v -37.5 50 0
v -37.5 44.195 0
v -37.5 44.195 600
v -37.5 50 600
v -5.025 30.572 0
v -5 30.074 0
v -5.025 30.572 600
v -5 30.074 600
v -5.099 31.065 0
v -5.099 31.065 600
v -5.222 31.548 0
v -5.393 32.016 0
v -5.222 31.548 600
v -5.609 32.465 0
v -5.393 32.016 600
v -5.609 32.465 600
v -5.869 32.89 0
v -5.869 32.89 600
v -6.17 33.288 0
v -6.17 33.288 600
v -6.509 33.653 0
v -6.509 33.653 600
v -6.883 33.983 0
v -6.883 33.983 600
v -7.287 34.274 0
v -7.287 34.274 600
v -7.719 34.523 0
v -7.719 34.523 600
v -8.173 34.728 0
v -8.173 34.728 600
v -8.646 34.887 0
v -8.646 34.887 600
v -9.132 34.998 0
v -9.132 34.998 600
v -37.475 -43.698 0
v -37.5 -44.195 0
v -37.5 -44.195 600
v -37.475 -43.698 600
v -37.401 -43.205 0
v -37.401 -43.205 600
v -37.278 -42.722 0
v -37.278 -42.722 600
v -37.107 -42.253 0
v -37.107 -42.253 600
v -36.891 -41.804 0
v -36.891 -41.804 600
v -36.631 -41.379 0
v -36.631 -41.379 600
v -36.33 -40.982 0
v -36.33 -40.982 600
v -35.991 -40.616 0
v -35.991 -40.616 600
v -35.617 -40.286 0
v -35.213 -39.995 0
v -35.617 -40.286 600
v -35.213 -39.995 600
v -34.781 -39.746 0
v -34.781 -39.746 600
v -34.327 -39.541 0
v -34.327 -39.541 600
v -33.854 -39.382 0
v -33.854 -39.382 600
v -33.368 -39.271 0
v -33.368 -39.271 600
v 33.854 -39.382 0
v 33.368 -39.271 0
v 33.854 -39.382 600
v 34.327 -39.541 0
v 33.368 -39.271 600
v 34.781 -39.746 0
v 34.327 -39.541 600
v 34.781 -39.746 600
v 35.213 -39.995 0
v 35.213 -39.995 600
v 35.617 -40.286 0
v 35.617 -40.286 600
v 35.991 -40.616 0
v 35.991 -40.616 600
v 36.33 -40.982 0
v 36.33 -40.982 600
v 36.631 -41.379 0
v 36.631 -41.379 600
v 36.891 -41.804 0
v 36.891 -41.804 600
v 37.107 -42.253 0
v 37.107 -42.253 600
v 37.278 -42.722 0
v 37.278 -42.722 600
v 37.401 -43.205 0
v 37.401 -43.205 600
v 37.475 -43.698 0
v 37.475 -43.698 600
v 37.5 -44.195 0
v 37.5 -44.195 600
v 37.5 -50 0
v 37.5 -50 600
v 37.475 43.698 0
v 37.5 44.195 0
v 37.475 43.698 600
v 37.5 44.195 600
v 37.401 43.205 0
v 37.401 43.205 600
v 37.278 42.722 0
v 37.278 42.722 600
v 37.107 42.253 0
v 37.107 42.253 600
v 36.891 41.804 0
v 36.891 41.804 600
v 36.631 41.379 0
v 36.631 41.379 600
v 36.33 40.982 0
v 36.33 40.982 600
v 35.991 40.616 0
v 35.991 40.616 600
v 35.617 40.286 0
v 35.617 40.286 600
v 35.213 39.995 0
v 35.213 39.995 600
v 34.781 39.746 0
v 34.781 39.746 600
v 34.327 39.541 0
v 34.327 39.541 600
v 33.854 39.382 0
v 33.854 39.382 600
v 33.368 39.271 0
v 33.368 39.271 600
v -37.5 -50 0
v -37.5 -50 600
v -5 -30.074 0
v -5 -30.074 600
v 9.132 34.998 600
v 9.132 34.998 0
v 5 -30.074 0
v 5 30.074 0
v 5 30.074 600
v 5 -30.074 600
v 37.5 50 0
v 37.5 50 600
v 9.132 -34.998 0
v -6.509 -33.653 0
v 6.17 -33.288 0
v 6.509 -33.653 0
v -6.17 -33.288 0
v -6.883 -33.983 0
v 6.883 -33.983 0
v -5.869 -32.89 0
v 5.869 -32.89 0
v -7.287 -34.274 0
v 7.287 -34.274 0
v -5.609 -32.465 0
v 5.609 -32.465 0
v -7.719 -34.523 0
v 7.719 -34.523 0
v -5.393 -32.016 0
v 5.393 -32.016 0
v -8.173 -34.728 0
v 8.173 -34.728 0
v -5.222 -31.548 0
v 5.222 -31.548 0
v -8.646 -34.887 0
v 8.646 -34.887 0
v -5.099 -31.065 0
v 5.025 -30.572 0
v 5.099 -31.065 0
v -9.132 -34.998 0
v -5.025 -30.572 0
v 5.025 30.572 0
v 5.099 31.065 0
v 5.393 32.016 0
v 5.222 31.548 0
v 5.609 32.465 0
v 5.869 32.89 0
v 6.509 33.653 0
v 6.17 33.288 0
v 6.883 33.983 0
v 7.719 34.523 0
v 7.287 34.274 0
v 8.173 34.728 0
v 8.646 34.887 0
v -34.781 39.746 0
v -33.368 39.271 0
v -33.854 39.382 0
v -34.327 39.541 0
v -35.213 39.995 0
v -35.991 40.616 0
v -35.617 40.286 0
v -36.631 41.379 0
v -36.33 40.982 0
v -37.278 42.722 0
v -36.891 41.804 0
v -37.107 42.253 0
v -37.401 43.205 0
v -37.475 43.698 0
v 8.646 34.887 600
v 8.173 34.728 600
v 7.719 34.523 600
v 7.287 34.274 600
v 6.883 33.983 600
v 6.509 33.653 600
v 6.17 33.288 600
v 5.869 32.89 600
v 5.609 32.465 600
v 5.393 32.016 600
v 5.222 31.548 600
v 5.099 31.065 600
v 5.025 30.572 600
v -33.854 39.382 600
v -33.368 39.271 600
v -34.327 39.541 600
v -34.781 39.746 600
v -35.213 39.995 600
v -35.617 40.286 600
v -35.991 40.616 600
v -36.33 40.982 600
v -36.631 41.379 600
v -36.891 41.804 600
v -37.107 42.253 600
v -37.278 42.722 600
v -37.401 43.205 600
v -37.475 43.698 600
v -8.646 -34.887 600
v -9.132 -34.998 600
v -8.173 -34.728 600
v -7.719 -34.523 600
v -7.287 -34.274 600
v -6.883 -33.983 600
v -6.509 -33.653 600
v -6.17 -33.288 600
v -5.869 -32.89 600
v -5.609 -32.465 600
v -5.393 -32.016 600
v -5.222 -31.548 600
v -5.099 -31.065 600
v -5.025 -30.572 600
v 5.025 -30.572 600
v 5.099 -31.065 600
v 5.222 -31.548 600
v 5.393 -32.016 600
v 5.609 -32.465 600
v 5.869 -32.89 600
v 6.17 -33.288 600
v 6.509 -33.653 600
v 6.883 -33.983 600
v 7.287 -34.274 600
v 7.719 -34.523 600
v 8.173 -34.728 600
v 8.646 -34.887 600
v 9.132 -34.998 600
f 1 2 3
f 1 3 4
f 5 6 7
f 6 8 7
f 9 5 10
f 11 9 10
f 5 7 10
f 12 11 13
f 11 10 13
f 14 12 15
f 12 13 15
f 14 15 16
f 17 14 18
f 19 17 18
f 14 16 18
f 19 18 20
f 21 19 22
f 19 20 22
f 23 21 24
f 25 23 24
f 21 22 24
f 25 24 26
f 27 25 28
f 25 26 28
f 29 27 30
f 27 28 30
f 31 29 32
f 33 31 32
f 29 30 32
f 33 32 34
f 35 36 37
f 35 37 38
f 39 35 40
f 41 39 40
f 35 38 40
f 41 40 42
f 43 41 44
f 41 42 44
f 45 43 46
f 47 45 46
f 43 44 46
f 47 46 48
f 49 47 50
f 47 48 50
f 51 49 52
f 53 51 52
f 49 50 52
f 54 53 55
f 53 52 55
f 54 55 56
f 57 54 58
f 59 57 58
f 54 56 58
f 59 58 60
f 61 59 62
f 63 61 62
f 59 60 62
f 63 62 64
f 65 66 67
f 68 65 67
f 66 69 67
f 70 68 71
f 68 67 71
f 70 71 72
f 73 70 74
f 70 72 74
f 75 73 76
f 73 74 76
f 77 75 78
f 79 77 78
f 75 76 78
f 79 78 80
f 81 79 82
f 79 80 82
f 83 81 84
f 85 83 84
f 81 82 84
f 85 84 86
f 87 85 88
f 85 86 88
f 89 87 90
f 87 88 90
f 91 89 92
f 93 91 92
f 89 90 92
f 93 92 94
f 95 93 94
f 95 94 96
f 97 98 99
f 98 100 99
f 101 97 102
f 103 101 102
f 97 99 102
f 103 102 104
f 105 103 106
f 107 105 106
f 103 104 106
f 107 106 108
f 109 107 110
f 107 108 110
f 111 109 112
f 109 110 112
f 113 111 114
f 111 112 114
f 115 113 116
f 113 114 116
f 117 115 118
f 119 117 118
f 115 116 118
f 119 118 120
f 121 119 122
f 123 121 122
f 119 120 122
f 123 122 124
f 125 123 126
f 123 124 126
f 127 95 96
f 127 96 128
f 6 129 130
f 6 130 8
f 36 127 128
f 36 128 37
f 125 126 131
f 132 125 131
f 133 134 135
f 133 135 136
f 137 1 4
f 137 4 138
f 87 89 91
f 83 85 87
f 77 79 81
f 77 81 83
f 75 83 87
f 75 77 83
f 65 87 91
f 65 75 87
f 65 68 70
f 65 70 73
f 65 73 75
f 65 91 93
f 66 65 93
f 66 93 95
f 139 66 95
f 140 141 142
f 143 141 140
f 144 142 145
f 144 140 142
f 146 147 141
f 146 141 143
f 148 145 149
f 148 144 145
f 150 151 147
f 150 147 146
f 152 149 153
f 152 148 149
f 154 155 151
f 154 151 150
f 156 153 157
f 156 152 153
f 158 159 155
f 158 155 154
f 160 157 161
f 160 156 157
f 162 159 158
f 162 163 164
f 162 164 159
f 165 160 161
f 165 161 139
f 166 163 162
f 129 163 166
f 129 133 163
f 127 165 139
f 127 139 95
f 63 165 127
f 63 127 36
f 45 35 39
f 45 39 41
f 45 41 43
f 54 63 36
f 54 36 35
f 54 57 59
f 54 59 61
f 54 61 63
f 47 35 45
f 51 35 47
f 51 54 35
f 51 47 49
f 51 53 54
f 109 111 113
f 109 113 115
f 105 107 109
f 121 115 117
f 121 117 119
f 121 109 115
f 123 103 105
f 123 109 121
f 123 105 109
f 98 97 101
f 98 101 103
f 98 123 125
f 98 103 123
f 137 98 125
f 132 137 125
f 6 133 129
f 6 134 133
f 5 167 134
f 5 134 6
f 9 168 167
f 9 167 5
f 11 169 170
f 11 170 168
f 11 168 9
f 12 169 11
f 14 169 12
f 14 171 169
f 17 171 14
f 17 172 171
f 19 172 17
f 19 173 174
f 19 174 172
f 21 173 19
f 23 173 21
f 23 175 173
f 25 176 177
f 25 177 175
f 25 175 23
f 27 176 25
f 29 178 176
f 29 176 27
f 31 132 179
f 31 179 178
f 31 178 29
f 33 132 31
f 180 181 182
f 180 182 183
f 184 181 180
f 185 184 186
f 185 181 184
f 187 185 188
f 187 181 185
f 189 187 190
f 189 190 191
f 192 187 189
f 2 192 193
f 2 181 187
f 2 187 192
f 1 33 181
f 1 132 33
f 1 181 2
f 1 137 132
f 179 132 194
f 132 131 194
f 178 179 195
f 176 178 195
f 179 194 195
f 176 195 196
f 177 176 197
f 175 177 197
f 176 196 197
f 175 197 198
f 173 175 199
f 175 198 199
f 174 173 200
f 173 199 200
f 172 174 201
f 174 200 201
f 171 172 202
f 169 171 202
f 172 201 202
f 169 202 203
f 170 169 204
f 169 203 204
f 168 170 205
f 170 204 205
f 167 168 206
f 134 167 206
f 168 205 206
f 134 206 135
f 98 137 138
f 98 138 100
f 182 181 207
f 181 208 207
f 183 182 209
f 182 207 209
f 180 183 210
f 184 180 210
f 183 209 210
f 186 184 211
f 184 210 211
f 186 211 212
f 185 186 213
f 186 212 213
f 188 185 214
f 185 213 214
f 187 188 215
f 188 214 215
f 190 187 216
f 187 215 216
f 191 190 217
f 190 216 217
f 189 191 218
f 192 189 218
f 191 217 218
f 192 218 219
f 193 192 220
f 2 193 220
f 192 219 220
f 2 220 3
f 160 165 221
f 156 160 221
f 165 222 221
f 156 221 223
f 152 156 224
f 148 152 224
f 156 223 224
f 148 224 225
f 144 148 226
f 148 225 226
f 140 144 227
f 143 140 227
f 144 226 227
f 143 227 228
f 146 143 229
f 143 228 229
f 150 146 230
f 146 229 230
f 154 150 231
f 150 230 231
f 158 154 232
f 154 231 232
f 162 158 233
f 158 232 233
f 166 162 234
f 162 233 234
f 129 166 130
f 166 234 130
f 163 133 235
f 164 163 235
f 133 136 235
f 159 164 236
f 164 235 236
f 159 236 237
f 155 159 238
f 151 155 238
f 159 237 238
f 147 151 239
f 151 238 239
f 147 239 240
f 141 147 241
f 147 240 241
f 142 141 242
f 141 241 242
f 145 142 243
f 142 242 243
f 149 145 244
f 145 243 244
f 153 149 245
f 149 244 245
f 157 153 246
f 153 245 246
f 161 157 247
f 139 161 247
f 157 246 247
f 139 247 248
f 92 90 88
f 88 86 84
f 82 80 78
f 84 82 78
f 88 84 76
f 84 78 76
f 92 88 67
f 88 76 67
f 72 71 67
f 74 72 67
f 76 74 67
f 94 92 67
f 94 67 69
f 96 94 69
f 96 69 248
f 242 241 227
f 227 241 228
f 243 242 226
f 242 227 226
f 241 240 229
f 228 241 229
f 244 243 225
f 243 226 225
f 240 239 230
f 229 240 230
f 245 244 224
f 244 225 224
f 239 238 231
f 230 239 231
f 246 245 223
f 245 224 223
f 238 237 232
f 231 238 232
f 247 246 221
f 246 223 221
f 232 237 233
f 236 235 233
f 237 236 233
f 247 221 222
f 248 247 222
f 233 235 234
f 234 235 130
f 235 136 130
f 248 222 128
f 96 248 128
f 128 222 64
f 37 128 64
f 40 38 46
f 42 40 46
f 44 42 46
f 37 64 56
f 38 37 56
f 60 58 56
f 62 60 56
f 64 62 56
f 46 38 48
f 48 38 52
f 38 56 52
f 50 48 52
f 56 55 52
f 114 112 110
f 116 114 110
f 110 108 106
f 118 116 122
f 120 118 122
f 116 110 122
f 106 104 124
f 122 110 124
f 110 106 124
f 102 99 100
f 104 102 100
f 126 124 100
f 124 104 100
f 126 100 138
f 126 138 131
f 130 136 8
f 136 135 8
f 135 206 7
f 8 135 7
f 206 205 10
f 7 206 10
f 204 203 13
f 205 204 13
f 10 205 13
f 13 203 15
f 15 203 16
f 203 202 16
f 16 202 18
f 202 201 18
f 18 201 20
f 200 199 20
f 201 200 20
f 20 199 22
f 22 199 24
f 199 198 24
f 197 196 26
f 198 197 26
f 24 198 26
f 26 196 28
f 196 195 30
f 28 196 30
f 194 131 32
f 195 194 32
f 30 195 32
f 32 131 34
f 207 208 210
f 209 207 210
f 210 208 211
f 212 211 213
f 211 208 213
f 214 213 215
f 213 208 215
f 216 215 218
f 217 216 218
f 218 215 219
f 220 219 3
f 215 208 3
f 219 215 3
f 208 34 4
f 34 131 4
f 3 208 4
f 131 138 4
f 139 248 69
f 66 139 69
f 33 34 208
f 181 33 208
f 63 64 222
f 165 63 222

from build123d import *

# Parameters (mm, degrees)
BOSS_EXTRUDE1_DEPTH = 600
FILLET1_R           = 5


with BuildPart() as part:
    # Sketch1 → Boss-Extrude1 (new body)
    with BuildSketch(Plane.XY):
        Polygon((-37.5, 50), (37.5, 50), (37.5, 40), (5, 34.269373127), (5, -34.269373127), (37.5, -40), (37.5, -50), (-37.5, -50), (-37.5, -40), (-5, -34.269373127), (-5, 34.269373127), (-37.5, 40), align=None)
    extrude(amount=BOSS_EXTRUDE1_DEPTH)

    # Fillet1
    fillet1_edges = [part.edges().sort_by_distance(p)[0] for p in [
        (5, 34.269373127, 300),
        (5, -34.269373127, 300),
        (37.5, -40, 300),
        (-37.5, -40, 300),
        (-5, -34.269373127, 300),
        (-5, 34.269373127, 300),
        (-37.5, 40, 300),
        (37.5, 40, 300),
    ]]
    fillet(fillet1_edges, radius=FILLET1_R)


solid = part.part
